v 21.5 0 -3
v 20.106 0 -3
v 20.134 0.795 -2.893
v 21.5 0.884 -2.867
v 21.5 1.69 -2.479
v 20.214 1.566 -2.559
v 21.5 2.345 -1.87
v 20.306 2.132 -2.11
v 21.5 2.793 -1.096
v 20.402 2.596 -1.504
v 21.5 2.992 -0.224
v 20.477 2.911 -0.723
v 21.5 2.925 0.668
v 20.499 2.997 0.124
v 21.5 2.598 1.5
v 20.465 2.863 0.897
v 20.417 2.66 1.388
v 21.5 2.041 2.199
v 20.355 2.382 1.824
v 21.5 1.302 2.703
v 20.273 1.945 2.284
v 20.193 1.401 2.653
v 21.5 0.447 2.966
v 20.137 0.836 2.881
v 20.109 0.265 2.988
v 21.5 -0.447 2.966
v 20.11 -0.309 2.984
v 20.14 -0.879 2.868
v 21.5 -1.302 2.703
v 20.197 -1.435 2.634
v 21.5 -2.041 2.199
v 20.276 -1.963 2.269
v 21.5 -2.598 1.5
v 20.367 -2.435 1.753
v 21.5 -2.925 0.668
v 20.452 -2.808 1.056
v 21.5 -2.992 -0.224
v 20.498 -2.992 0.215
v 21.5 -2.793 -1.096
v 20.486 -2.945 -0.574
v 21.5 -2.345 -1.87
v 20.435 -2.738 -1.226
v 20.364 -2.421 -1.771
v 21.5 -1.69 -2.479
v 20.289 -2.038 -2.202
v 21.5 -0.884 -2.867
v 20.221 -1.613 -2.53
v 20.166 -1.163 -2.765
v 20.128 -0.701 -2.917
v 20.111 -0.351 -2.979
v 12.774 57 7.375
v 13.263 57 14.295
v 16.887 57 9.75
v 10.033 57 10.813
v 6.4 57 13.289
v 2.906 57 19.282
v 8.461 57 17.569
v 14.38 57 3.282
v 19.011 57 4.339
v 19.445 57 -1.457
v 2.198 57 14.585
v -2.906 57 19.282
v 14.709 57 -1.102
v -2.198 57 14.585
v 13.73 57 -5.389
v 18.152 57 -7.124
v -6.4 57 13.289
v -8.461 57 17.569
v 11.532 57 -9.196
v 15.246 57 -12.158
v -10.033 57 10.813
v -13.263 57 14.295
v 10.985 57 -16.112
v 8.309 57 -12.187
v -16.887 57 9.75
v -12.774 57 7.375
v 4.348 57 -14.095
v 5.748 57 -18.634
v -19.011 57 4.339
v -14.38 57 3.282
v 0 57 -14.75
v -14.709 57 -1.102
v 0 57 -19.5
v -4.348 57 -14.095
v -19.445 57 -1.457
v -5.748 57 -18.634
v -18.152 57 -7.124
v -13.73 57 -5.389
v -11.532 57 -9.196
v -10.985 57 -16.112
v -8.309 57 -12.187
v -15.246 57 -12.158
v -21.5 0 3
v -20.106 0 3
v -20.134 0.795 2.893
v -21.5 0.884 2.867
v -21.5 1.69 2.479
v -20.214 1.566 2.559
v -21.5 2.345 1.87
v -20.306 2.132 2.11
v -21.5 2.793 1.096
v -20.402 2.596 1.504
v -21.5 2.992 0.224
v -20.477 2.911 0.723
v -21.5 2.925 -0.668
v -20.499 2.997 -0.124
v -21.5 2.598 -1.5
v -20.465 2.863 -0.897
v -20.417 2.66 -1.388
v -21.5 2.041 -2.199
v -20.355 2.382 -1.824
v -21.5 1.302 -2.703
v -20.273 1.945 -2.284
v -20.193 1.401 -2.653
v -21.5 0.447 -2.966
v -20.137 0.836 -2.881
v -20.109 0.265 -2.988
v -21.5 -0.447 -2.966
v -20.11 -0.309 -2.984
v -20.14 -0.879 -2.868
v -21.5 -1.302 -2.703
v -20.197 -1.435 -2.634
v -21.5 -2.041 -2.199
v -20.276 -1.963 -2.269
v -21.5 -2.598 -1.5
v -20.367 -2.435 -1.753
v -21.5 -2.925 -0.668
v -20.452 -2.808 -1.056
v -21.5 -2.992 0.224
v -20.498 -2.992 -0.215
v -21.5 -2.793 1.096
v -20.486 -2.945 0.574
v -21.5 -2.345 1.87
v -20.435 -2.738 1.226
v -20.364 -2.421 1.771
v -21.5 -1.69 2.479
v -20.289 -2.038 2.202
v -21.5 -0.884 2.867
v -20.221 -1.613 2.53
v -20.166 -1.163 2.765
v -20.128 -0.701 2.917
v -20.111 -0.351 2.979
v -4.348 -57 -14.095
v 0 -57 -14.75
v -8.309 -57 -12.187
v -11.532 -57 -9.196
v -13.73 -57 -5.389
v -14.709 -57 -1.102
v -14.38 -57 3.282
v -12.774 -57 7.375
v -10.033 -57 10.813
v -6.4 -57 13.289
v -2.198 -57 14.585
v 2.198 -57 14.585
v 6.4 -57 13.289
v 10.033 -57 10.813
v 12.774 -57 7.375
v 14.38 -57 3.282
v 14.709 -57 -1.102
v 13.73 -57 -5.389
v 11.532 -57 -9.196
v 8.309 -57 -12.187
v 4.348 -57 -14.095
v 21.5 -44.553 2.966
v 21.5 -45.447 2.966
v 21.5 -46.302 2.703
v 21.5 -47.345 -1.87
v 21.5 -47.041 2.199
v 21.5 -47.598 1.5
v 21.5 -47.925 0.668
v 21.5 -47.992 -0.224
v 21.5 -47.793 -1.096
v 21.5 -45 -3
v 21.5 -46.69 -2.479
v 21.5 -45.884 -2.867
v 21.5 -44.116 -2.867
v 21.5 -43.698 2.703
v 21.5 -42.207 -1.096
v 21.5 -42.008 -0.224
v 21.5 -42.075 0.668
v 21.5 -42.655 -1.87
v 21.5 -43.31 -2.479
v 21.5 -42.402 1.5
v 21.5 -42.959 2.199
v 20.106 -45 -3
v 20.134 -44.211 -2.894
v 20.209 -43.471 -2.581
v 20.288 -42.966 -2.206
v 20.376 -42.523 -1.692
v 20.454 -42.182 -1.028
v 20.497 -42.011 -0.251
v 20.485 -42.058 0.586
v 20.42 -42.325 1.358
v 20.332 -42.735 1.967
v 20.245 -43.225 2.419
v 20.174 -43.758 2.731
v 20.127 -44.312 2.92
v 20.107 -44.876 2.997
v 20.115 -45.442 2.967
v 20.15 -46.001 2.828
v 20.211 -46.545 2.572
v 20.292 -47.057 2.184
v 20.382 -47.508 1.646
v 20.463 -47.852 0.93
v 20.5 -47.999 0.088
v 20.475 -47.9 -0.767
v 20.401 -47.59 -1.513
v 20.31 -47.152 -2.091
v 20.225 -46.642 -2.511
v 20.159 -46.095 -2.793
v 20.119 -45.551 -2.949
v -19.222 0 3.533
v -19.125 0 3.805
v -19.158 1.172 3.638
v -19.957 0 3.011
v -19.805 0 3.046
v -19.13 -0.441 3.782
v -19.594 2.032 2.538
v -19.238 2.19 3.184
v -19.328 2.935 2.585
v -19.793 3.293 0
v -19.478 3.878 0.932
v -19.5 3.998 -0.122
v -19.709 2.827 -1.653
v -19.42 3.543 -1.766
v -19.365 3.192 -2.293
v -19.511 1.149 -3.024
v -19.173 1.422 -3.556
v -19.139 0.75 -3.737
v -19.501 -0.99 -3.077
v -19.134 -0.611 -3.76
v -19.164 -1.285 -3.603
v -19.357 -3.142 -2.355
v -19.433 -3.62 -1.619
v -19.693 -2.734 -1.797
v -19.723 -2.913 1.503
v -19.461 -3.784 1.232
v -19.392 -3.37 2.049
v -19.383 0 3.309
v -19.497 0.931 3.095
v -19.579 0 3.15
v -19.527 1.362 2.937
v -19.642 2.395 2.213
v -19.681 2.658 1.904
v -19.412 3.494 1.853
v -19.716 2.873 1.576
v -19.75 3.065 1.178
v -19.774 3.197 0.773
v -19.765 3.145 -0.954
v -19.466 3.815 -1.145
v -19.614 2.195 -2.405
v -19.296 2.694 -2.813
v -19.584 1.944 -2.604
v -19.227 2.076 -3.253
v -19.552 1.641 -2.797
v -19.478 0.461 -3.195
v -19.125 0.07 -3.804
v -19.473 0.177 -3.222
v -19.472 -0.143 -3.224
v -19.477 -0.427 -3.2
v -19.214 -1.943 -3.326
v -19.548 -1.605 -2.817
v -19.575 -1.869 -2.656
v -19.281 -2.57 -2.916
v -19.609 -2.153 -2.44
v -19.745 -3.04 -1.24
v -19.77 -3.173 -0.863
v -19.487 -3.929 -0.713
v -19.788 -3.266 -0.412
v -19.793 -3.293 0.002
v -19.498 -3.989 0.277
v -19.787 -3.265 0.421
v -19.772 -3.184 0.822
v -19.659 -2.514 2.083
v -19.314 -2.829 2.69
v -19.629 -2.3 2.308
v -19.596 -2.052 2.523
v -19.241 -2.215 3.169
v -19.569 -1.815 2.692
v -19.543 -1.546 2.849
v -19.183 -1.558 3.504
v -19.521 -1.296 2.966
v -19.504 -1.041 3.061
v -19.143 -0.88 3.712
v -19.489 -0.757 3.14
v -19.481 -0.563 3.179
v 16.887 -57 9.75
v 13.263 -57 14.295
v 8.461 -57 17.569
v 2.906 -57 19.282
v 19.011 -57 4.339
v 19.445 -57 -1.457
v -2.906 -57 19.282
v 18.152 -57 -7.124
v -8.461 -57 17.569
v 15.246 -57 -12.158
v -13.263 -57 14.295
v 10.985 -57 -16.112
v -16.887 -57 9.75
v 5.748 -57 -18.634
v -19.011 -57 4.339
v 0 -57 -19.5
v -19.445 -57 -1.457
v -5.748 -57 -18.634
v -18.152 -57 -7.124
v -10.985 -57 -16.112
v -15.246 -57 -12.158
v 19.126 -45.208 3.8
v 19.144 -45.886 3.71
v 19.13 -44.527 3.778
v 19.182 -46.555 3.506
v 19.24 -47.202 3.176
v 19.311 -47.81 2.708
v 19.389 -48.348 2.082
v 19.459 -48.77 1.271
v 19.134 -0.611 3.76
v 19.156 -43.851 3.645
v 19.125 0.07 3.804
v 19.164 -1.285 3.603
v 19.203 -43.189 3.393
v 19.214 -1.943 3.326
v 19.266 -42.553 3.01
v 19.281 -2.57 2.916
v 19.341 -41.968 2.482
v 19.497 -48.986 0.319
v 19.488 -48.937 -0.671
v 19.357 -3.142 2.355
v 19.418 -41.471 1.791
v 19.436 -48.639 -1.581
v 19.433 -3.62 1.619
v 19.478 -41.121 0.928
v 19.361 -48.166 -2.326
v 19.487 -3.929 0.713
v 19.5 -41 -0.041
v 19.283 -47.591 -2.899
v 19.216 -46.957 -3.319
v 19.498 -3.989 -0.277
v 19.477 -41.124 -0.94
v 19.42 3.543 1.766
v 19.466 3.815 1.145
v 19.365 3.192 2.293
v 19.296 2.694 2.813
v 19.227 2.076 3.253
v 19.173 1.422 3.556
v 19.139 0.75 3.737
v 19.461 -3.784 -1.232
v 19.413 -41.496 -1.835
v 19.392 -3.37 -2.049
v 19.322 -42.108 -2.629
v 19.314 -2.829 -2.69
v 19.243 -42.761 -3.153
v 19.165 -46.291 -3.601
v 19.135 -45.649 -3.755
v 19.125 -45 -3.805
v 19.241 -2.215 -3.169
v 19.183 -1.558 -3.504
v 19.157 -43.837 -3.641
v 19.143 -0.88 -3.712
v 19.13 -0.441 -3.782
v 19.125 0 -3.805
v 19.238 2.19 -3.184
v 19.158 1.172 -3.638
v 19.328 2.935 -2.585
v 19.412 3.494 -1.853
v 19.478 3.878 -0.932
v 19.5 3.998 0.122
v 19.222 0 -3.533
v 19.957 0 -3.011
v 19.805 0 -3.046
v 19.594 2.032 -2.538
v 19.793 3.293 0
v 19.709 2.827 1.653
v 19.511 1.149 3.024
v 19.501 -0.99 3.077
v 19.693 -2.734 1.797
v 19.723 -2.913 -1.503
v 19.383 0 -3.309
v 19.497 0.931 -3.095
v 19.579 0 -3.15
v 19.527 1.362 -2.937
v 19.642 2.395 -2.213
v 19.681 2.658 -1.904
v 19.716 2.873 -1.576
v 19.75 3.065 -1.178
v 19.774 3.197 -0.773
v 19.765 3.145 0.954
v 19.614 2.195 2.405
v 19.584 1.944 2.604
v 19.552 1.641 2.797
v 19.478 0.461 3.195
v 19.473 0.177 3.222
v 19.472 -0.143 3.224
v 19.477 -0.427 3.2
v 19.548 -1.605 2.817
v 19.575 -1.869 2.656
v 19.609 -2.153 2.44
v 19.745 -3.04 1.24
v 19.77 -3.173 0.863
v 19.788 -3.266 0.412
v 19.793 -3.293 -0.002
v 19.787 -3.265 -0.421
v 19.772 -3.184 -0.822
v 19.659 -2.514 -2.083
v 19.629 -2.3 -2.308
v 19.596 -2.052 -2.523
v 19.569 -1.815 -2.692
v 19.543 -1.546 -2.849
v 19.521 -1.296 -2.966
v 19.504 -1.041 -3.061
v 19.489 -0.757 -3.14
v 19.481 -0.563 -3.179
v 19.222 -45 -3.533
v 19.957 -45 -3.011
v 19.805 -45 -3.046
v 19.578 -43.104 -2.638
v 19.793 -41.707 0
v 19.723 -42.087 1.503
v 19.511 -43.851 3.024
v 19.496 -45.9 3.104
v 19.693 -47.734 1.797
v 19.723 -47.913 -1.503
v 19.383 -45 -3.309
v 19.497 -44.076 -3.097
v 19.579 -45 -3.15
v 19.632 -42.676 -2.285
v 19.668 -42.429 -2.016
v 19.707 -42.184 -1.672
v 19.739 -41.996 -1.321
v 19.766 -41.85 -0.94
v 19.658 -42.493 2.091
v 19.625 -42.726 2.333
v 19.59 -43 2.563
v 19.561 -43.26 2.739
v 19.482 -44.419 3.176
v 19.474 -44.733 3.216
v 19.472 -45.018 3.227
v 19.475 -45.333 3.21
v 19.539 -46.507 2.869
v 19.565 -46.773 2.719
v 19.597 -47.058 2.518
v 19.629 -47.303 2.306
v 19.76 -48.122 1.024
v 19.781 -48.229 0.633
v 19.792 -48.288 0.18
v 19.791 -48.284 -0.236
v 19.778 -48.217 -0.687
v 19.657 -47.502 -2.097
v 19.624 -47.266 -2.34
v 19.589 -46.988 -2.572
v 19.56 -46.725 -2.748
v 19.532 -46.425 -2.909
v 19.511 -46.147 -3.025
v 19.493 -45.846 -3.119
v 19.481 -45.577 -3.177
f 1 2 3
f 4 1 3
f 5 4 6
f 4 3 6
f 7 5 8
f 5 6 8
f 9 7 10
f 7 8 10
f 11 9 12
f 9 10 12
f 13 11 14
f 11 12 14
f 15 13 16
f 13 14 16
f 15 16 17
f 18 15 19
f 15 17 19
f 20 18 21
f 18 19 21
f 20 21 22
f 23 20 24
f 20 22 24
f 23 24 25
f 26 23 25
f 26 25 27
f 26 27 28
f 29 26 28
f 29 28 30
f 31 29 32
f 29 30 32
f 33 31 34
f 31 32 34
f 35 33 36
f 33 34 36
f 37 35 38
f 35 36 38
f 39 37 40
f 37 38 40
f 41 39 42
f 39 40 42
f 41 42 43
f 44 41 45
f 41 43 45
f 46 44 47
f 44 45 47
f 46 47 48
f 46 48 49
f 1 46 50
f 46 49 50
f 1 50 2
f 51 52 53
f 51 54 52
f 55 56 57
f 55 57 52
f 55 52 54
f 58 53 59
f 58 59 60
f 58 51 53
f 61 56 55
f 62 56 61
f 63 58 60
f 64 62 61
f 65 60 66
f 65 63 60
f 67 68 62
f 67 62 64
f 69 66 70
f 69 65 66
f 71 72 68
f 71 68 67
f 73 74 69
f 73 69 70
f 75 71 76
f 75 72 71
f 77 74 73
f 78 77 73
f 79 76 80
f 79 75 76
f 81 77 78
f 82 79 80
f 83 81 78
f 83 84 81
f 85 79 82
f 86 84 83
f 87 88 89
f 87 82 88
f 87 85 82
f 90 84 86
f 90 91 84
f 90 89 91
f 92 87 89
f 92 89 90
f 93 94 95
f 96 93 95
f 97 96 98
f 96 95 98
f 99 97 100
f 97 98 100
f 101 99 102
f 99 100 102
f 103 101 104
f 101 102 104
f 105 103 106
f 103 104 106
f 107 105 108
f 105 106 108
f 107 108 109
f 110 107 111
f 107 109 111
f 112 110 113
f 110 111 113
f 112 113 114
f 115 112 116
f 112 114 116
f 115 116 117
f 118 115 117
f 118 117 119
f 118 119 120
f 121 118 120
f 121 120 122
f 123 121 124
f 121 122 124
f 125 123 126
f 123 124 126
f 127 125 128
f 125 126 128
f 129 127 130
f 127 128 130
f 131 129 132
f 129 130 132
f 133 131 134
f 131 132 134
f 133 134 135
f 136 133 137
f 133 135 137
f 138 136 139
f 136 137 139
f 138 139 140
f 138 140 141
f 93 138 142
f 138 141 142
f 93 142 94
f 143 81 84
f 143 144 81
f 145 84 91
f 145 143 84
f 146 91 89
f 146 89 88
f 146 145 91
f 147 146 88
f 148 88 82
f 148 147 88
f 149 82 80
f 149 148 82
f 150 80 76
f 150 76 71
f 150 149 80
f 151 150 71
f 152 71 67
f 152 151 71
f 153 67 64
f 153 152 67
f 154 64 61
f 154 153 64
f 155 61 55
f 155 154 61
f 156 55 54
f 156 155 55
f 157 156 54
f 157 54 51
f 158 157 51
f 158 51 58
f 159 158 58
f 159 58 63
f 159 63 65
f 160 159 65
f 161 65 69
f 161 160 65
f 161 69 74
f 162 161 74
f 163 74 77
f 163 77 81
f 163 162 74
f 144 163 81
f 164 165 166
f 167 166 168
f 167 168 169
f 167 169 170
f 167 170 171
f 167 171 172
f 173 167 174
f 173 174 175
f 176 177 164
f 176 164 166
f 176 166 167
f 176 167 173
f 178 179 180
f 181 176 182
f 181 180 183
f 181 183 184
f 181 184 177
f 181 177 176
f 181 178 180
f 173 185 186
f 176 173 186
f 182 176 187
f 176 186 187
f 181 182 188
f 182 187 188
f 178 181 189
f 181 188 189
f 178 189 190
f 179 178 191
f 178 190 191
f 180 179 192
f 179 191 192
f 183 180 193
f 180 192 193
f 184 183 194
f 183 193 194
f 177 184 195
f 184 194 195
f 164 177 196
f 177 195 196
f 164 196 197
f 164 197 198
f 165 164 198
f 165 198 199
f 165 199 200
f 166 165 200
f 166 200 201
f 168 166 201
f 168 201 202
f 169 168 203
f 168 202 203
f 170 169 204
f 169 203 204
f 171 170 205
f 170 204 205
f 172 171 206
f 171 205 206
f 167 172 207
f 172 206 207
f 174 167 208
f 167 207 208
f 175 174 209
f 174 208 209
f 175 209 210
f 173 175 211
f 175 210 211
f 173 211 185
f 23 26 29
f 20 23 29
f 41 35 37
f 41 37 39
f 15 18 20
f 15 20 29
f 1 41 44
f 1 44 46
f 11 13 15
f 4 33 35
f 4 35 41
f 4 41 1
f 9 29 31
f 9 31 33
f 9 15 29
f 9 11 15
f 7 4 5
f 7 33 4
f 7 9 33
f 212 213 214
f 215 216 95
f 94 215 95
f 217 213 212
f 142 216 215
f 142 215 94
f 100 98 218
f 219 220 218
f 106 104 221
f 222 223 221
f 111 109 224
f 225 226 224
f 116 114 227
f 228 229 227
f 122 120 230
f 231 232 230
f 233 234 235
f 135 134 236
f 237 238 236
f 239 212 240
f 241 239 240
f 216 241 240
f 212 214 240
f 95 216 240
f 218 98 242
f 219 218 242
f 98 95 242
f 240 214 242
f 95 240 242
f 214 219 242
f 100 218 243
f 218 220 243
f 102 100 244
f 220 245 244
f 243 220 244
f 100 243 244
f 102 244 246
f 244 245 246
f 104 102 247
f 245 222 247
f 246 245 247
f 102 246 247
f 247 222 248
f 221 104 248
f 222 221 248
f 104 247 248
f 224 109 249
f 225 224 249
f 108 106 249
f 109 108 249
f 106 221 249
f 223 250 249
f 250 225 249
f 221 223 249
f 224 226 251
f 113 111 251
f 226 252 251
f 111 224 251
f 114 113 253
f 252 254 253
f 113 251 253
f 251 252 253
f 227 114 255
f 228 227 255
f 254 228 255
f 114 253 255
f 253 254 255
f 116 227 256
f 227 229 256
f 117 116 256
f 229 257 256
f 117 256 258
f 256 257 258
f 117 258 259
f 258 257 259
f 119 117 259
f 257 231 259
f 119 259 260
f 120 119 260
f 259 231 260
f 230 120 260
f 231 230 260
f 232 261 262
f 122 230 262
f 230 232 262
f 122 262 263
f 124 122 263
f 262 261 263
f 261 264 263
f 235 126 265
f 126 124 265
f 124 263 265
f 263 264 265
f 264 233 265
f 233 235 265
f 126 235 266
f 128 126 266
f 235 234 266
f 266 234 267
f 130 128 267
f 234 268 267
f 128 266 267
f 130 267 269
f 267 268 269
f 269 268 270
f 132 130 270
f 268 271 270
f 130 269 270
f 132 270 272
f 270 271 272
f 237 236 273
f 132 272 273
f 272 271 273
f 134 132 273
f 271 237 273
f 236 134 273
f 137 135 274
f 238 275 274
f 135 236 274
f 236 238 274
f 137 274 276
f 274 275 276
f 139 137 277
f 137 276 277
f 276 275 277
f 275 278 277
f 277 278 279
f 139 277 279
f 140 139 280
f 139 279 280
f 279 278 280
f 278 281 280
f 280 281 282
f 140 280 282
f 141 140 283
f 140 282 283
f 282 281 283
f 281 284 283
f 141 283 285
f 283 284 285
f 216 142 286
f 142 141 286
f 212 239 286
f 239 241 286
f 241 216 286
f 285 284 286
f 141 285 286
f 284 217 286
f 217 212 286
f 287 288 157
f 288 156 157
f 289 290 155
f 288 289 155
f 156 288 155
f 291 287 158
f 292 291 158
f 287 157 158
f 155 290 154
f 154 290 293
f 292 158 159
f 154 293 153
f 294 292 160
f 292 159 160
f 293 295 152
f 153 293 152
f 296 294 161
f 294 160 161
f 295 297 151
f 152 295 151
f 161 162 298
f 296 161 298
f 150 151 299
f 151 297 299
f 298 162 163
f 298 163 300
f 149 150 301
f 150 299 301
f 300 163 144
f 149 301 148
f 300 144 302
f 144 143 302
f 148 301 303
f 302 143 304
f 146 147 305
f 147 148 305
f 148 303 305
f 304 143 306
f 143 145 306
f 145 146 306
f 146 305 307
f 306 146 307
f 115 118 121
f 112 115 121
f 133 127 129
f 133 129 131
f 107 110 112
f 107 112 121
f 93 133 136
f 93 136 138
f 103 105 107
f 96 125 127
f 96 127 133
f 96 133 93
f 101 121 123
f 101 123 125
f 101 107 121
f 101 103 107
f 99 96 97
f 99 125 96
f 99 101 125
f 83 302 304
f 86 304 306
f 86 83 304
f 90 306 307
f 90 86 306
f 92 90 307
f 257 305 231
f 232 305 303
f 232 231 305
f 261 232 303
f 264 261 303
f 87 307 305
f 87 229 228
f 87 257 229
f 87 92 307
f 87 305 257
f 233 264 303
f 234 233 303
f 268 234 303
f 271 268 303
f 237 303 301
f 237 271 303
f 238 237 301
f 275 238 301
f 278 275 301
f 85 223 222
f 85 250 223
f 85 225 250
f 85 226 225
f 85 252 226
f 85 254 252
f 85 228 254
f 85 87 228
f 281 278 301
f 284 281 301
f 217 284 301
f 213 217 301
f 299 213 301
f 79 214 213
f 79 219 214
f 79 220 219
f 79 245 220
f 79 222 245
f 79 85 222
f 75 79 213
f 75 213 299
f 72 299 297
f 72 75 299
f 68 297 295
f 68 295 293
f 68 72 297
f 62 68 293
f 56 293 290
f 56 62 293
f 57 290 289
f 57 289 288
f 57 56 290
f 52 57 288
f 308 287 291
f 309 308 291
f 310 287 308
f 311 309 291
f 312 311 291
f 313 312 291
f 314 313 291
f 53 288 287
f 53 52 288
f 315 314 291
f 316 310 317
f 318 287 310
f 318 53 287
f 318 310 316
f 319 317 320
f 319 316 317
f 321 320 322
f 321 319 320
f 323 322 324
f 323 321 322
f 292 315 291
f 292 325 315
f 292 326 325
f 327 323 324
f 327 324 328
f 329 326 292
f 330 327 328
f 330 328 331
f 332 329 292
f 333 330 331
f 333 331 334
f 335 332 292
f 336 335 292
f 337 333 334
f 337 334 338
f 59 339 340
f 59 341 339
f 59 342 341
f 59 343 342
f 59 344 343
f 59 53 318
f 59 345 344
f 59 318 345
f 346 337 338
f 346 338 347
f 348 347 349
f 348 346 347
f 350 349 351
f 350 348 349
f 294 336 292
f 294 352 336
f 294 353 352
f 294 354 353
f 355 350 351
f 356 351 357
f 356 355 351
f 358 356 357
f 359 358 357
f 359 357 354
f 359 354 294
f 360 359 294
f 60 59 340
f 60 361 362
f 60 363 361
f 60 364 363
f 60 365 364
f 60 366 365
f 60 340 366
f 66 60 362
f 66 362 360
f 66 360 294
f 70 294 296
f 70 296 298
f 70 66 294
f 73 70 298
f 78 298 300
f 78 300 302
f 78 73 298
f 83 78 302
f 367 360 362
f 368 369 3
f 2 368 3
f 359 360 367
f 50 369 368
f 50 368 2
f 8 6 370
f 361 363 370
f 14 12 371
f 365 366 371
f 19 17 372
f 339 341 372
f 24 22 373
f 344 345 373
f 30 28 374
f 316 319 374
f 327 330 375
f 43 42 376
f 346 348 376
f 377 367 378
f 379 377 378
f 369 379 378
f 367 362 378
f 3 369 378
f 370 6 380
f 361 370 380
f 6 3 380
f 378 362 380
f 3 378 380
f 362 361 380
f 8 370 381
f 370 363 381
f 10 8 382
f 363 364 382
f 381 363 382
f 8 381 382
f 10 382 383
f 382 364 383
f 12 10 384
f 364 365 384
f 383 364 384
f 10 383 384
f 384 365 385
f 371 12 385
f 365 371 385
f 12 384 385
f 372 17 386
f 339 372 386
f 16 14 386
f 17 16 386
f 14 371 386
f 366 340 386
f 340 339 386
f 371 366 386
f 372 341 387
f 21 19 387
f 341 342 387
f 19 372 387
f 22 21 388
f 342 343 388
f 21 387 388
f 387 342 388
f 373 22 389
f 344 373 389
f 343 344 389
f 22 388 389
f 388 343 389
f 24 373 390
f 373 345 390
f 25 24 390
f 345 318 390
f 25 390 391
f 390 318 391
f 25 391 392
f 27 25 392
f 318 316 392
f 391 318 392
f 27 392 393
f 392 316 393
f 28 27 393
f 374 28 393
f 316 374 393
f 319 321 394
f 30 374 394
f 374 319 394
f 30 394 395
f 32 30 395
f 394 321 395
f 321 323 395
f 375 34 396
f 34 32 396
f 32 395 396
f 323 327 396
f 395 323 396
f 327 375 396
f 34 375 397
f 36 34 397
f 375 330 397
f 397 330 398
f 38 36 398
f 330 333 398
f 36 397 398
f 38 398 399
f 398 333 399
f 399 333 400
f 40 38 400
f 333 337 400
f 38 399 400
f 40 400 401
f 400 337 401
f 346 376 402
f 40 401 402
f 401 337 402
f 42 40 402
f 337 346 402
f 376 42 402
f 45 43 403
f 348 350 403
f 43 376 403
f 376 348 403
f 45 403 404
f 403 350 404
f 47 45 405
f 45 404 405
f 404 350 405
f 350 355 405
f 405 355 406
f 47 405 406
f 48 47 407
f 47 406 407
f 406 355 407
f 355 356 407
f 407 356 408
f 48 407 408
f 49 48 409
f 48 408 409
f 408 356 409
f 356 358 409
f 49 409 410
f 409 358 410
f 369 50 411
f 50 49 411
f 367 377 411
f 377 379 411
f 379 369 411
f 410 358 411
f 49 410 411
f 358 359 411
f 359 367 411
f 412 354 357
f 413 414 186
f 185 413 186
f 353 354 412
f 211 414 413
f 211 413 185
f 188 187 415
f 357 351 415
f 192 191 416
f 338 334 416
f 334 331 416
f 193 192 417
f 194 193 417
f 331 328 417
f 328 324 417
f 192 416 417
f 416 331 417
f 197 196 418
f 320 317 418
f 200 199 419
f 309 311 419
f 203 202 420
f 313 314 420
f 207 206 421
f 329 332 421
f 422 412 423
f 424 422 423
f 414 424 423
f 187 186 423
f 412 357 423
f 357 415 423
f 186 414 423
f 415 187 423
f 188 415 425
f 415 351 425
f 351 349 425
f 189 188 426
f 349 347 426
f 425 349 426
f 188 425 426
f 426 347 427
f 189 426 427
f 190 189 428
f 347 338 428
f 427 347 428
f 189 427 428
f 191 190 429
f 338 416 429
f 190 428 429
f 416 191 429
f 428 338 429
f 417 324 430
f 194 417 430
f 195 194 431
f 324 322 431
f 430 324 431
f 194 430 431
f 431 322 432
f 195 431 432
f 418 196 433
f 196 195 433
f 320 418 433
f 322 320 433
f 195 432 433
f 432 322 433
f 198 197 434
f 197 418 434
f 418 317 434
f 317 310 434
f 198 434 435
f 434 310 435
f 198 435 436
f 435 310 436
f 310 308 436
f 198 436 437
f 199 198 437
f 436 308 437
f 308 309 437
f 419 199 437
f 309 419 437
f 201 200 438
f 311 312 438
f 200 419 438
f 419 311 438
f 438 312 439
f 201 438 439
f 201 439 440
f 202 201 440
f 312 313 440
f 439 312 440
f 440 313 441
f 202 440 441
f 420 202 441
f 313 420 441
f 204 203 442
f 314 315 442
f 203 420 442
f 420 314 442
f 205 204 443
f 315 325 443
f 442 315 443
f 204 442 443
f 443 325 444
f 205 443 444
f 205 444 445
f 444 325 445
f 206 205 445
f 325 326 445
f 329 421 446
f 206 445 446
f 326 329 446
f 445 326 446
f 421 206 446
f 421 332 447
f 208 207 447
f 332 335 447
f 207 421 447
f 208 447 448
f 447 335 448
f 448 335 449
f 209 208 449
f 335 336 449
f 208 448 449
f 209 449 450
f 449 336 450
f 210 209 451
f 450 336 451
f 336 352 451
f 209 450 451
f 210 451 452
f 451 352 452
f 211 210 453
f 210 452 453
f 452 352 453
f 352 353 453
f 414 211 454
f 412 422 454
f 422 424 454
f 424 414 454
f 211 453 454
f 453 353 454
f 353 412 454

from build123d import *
from build123d.topology import SkipClean

# Parameters (mm, degrees)
SKETCH1_R                            = 19.5
SKETCH1_R_2                          = 14.75
BOSS_EXTRUDE1_DEPTH                  = 57
SKETCH2_R                            = 3
BOSS_EXTRUDE2_DEPTH                  = 2
BOSS_EXTRUDE2_DIRECTION_2_REACH      = 73.765
BOSS_EXTRUDE2_DIRECTION_2_END_RADIUS = 19.5
SKETCH3_R                            = 3
BOSS_EXTRUDE4_DEPTH                  = 2
BOSS_EXTRUDE4_DIRECTION_2_REACH      = 74.871
BOSS_EXTRUDE4_DIRECTION_2_END_RADIUS = 19.5
FILLET3_R                            = 1


with BuildPart() as part:
    # Sketch1 → Boss-Extrude1 (new, symmetric)
    with BuildSketch(Plane(origin=(0, 0, 0), x_dir=(1, 0, 0), z_dir=(0, 1, 0))):
        with Locations(Location((0, 0, 0), (0, 0, 90))):
            Circle(SKETCH1_R)
        with Locations(Location((0, 0, 0), (0, 0, 90))):
            Circle(SKETCH1_R_2, mode=Mode.SUBTRACT)
    extrude(amount=BOSS_EXTRUDE1_DEPTH, both=True)


with BuildPart() as body_2:
    # Sketch2 → Boss-Extrude2 (new body)
    with BuildSketch(Plane(origin=(19.5, 0, 0), x_dir=(0, 0, -1), z_dir=(1, 0, 0))):
        with Locations((0, -45)):
            Circle(SKETCH2_R)
        Circle(SKETCH2_R)
    extrude(amount=BOSS_EXTRUDE2_DEPTH)

    # Boss-Extrude2 direction 2: up to this cylinder (the profile starts outside it)
    with SkipClean():  # the faces are left unmerged after this step: merging them gives an invalid solid
        boss_extrude2_direction_2_end = Plane(origin=(0, -22.5, 0), z_dir=(0, -1, 0)) * Cylinder(BOSS_EXTRUDE2_DIRECTION_2_END_RADIUS, 232.53, mode=Mode.PRIVATE)
        # Sketch2 → Boss-Extrude2 direction 2 (add, up to the surface)
        with BuildSketch(Plane(origin=(19.5, 0, 0), x_dir=(0, 0, -1), z_dir=(1, 0, 0)), mode=Mode.PRIVATE) as boss_extrude2_direction_2_sk1:
            with Locations((0, -45)):
                Circle(SKETCH2_R)
        boss_extrude2_direction_2_tool1 = extrude(boss_extrude2_direction_2_sk1.sketch, amount=-BOSS_EXTRUDE2_DIRECTION_2_REACH, mode=Mode.PRIVATE) - boss_extrude2_direction_2_end
        add(boss_extrude2_direction_2_tool1.solids().sort_by_distance((19.5, -45, 0))[0])
        add(boss_extrude2_direction_2_tool1.solids().sort_by_distance((19.5, -45, 0))[1])
        # Sketch2 → Boss-Extrude2 direction 2 (add, up to the surface)
        with BuildSketch(Plane(origin=(19.5, 0, 0), x_dir=(0, 0, -1), z_dir=(1, 0, 0)), mode=Mode.PRIVATE) as boss_extrude2_direction_2_sk2:
            Circle(SKETCH2_R)
        boss_extrude2_direction_2_tool2 = extrude(boss_extrude2_direction_2_sk2.sketch, amount=-BOSS_EXTRUDE2_DIRECTION_2_REACH, mode=Mode.PRIVATE) - boss_extrude2_direction_2_end
        add(boss_extrude2_direction_2_tool2.solids().sort_by_distance((19.5, 0, 0))[0])
        add(boss_extrude2_direction_2_tool2.solids().sort_by_distance((19.5, 0, 0))[1])


with BuildPart() as body_3:
    # Sketch3 → Boss-Extrude4 (new body)
    with BuildSketch(Plane.ZY.offset(19.5)):
        Circle(SKETCH3_R)
    extrude(amount=BOSS_EXTRUDE4_DEPTH)

    # Boss-Extrude4 direction 2: up to this cylinder (the profile starts outside it)
    with SkipClean():  # the faces are left unmerged after this step: merging them gives an invalid solid
        boss_extrude4_direction_2_end = Plane(origin=(0, 0, 0), z_dir=(0, -1, 0)) * Cylinder(BOSS_EXTRUDE4_DIRECTION_2_END_RADIUS, 189.742, mode=Mode.PRIVATE)
        # Sketch3 → Boss-Extrude4 direction 2 (add, up to the surface)
        with BuildSketch(Plane.ZY.offset(19.5), mode=Mode.PRIVATE) as boss_extrude4_direction_2_sk1:
            Circle(SKETCH3_R)
        boss_extrude4_direction_2_tool1 = extrude(boss_extrude4_direction_2_sk1.sketch, amount=-BOSS_EXTRUDE4_DIRECTION_2_REACH, mode=Mode.PRIVATE) - boss_extrude4_direction_2_end
        add(boss_extrude4_direction_2_tool1.solids().sort_by_distance((-19.5, 0, 0))[0])
        add(boss_extrude4_direction_2_tool1.solids().sort_by_distance((-19.5, 0, 0))[1])


with BuildPart() as body_2_1:
    add(body_2.part)

    # Combine1: union part, body 3
    add(part.part)
    add(body_3.part)

    # Fillet3
    fillet3_edges = [body_2_1.edges().sort_by_distance(p)[0] for p in [
        (19.267848866, -45, 3.000000015),
        (19.267848866, 0, 3.000000015),
        (-19.267848866, 0, -3.000000015),
    ]]
    fillet(fillet3_edges, radius=FILLET3_R)


solid = body_2_1.part
